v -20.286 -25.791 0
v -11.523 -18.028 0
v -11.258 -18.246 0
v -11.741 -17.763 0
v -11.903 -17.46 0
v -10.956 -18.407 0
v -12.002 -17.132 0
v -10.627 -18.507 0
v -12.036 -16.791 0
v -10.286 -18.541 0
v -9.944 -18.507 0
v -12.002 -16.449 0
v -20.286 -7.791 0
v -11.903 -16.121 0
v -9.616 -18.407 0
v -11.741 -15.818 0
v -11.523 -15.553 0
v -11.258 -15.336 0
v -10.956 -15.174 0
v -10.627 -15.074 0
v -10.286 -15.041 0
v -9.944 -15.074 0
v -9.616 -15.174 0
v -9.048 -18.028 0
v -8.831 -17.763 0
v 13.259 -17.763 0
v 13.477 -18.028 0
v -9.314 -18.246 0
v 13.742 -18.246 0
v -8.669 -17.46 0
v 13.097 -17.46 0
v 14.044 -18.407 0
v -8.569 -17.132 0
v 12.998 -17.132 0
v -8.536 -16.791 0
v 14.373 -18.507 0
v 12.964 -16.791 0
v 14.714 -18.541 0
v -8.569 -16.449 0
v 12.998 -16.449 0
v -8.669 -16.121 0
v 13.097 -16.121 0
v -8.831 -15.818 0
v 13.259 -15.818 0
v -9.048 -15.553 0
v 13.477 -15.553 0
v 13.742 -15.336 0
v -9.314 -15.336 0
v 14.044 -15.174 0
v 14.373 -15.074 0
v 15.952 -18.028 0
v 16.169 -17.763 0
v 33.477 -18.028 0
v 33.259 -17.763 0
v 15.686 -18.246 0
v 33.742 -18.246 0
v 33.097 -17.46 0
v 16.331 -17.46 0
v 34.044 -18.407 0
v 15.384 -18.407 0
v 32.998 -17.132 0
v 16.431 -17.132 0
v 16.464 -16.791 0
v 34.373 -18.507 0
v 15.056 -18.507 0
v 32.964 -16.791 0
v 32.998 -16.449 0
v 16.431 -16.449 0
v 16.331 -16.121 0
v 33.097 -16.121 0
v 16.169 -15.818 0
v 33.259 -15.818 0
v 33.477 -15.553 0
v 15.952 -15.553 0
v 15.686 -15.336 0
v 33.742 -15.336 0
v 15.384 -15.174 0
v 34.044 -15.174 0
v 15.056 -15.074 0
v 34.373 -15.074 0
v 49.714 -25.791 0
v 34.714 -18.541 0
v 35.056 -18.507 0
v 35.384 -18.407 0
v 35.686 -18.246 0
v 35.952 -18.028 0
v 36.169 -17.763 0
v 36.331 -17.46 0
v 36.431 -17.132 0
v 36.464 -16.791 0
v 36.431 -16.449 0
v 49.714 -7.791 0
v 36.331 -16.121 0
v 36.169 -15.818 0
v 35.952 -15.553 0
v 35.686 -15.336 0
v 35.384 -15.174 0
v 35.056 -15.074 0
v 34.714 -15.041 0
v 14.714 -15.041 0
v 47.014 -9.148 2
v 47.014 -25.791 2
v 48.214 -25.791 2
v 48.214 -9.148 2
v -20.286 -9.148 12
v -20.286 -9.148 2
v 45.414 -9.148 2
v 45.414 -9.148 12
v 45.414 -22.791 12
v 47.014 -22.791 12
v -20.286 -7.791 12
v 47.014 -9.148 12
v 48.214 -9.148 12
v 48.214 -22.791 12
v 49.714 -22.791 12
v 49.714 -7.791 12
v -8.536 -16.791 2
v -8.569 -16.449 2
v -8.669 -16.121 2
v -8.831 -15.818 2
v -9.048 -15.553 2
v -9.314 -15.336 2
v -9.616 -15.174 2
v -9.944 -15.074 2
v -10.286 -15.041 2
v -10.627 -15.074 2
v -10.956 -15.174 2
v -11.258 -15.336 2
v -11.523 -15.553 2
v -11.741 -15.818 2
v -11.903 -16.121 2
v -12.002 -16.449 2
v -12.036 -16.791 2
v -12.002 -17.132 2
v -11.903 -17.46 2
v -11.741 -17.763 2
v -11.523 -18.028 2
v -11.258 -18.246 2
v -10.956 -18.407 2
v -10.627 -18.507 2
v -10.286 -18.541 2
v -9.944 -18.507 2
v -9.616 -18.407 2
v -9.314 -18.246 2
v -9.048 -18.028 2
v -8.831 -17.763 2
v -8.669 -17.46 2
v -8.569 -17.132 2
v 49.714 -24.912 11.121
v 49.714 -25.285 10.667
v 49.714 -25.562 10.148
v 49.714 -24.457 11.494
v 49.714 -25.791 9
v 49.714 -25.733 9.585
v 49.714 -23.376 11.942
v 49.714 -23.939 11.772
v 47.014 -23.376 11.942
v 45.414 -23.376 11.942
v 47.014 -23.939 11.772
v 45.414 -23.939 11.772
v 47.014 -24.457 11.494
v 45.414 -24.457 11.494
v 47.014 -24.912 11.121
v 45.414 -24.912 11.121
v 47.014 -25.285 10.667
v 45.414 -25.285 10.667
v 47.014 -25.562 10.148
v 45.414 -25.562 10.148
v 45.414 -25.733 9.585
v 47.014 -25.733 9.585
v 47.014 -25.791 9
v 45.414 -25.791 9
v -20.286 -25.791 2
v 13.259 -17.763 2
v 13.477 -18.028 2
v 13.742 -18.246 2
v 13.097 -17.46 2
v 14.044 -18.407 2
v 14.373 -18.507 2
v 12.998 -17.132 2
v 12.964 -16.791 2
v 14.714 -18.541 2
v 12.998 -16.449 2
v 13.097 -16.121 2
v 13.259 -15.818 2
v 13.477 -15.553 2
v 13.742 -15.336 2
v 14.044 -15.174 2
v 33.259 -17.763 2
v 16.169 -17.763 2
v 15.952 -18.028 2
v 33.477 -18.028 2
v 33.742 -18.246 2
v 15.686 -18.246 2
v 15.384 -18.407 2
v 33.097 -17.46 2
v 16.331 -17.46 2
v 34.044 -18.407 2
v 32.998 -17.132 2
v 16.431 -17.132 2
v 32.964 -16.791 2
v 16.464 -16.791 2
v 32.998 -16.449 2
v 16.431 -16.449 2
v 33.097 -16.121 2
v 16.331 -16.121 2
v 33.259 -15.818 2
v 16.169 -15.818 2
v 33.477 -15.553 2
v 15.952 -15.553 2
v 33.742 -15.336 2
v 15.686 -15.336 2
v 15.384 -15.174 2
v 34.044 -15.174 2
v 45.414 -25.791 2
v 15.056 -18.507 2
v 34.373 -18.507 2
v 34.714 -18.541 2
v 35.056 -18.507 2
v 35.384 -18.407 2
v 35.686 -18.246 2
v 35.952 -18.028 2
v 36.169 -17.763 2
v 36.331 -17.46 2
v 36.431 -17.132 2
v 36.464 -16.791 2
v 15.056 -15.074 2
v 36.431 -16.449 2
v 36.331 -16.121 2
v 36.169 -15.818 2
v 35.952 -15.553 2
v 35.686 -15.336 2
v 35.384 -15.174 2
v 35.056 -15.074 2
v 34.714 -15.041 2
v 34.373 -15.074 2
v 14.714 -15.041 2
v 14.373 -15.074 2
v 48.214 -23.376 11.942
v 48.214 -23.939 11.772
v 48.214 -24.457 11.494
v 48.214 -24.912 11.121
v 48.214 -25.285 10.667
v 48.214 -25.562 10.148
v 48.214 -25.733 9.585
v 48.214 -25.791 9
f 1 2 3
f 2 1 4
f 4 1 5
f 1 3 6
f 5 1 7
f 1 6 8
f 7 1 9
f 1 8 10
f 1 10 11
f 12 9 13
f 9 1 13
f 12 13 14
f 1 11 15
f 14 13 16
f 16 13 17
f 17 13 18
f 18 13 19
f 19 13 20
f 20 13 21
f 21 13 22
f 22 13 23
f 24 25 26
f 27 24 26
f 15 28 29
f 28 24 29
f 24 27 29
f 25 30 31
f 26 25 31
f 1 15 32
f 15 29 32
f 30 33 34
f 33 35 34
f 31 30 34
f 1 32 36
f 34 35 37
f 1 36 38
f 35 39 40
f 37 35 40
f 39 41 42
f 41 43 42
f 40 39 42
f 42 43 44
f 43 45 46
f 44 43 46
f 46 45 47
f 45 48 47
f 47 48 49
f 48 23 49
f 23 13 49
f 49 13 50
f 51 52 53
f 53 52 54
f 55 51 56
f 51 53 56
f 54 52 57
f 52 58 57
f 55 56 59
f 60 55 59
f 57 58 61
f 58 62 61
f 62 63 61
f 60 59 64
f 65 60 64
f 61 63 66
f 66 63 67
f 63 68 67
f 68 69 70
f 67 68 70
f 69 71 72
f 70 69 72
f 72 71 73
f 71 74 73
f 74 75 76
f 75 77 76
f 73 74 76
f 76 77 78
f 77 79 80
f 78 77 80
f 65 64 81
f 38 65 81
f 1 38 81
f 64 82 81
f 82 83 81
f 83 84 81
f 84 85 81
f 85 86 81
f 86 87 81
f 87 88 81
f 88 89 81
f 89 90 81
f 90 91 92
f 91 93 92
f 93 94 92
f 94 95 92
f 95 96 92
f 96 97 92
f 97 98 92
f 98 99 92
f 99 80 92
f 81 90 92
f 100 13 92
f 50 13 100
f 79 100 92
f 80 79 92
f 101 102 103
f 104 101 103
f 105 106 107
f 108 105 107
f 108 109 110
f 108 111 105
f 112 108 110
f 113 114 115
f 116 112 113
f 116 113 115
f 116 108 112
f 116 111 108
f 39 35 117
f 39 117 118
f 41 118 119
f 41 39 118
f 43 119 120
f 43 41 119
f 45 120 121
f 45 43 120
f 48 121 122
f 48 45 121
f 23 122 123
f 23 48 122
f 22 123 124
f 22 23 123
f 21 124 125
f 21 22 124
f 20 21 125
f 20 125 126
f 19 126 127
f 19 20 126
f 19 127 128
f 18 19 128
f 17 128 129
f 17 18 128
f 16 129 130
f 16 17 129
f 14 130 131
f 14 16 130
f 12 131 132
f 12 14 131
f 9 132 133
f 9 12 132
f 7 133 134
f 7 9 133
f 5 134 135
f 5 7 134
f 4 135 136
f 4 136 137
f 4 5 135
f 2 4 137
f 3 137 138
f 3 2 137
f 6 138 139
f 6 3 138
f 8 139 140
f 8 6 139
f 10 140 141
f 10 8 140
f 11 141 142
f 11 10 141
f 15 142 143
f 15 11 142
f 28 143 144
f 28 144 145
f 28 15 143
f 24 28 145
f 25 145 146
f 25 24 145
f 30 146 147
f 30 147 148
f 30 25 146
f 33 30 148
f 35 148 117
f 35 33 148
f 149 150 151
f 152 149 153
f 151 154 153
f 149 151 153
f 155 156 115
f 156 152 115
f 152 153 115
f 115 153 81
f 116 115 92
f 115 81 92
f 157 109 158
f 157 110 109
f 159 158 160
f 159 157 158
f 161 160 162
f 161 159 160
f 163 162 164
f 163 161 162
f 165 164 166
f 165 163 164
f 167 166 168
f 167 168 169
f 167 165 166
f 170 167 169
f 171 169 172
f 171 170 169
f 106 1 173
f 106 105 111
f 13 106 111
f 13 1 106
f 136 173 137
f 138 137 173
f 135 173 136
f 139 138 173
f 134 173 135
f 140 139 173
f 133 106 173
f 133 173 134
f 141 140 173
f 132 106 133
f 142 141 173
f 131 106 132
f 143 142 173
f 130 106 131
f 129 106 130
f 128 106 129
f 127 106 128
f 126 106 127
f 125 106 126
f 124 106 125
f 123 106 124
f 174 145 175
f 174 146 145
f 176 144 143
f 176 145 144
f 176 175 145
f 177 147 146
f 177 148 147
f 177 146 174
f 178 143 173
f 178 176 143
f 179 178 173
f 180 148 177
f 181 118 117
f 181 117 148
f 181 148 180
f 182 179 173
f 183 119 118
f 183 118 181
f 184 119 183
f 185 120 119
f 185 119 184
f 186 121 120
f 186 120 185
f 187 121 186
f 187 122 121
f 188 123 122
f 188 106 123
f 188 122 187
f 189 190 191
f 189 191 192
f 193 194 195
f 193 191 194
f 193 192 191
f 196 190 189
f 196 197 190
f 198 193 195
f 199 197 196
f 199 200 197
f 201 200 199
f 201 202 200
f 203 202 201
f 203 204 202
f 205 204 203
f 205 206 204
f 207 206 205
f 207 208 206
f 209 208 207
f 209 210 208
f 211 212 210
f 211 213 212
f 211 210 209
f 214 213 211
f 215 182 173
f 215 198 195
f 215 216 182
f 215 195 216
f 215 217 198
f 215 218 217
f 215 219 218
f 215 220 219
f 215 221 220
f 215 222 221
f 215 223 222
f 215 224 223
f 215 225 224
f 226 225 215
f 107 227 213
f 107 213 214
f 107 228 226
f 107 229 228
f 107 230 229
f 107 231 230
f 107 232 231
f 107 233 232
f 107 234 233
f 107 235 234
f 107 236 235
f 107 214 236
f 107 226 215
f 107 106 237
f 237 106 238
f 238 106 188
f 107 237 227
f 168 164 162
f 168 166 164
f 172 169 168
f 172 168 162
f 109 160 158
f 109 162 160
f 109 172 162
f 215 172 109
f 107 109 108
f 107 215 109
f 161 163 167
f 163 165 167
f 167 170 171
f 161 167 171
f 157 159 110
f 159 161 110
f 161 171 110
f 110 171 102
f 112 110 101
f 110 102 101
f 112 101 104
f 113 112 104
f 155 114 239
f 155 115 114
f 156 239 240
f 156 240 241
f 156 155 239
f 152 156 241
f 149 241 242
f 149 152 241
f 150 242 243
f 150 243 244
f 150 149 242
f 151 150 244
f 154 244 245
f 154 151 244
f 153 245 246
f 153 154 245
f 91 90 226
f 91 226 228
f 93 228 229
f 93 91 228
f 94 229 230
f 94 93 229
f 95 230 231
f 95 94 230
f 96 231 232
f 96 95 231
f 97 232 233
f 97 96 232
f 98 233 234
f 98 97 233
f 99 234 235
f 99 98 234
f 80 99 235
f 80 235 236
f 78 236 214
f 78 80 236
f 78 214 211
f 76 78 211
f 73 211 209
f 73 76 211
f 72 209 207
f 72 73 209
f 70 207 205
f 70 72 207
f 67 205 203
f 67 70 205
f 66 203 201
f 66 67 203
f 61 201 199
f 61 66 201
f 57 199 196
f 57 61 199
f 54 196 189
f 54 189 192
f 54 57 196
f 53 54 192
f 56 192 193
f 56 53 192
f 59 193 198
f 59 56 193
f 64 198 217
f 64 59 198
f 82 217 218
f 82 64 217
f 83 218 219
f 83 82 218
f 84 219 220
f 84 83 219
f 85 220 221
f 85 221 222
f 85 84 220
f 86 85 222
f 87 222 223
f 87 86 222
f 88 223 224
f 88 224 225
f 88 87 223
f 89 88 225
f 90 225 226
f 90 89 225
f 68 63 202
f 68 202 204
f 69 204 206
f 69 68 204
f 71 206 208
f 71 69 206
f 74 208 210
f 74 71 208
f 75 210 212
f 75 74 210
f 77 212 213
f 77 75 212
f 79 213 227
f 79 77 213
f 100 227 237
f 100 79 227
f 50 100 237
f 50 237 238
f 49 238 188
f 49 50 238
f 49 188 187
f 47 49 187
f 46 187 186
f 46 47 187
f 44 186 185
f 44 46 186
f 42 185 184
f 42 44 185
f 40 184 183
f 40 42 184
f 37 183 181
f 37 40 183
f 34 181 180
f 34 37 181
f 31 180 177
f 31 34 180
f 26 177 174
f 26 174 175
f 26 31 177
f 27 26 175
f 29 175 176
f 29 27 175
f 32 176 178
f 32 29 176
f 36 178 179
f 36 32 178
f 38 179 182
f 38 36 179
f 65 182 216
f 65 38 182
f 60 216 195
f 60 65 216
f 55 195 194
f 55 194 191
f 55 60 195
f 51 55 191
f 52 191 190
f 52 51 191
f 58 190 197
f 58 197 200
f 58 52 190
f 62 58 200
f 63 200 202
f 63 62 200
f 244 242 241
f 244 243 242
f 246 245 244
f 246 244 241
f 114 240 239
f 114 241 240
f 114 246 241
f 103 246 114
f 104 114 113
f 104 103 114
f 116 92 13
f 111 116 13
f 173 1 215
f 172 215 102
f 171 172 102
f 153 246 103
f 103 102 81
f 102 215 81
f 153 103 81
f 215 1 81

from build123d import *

# Parameters (mm, degrees)
F0_W     = 1.5
F0_H     = 16.642398566
F0_W_2   = 1.6
F1_DEPTH = 12
F0_W_3   = 65.7
F0_R     = 1.75
F0_W_4   = 1.2
F2_DEPTH = 2
F3_R     = 3


with BuildPart() as f1:
    # F0 (on Top) → F1 (new body)
    with BuildSketch(Plane.XY):
        Polygon((49.7141629457, -7.7906338274), (-20.2858370543, -7.7906338274), (-20.2858370543, -9.1482352614), (45.4141629457, -9.1482352614), (47.0141629457, -9.1482352614), (48.2141629457, -9.1482352614), (49.7141629457, -9.1482352614), align=None)
        with Locations((48.9641629457, -17.4694345444)):
            Rectangle(F0_W, F0_H)
        with Locations((46.2141629457, -17.4694345444)):
            Rectangle(F0_W_2, F0_H)
    extrude(amount=F1_DEPTH)

    # F0 (on Top) → F2 (join)
    with BuildSketch(Plane.XY):
        with Locations((12.5641629457, -17.4694345444)):
            Rectangle(F0_W_3, F0_H)
        with Locations((-10.2858370543, -16.7906338274)):
            Circle(F0_R, mode=Mode.SUBTRACT)
        with Locations((14.7141629457, -16.7906338274)):
            Circle(F0_R, mode=Mode.SUBTRACT)
        with Locations((34.7141629457, -16.7906338274)):
            Circle(F0_R, mode=Mode.SUBTRACT)
        with Locations((47.6141629457, -17.4694345444)):
            Rectangle(F0_W_4, F0_H)
    extrude(amount=F2_DEPTH)

    # F3
    f3_edges = [f1.edges().sort_by_distance(p)[0] for p in [
        (48.964163, -25.790634, 12),
        (46.214163, -25.790634, 12),
    ]]
    fillet(f3_edges, radius=F3_R)


solid = f1.part
